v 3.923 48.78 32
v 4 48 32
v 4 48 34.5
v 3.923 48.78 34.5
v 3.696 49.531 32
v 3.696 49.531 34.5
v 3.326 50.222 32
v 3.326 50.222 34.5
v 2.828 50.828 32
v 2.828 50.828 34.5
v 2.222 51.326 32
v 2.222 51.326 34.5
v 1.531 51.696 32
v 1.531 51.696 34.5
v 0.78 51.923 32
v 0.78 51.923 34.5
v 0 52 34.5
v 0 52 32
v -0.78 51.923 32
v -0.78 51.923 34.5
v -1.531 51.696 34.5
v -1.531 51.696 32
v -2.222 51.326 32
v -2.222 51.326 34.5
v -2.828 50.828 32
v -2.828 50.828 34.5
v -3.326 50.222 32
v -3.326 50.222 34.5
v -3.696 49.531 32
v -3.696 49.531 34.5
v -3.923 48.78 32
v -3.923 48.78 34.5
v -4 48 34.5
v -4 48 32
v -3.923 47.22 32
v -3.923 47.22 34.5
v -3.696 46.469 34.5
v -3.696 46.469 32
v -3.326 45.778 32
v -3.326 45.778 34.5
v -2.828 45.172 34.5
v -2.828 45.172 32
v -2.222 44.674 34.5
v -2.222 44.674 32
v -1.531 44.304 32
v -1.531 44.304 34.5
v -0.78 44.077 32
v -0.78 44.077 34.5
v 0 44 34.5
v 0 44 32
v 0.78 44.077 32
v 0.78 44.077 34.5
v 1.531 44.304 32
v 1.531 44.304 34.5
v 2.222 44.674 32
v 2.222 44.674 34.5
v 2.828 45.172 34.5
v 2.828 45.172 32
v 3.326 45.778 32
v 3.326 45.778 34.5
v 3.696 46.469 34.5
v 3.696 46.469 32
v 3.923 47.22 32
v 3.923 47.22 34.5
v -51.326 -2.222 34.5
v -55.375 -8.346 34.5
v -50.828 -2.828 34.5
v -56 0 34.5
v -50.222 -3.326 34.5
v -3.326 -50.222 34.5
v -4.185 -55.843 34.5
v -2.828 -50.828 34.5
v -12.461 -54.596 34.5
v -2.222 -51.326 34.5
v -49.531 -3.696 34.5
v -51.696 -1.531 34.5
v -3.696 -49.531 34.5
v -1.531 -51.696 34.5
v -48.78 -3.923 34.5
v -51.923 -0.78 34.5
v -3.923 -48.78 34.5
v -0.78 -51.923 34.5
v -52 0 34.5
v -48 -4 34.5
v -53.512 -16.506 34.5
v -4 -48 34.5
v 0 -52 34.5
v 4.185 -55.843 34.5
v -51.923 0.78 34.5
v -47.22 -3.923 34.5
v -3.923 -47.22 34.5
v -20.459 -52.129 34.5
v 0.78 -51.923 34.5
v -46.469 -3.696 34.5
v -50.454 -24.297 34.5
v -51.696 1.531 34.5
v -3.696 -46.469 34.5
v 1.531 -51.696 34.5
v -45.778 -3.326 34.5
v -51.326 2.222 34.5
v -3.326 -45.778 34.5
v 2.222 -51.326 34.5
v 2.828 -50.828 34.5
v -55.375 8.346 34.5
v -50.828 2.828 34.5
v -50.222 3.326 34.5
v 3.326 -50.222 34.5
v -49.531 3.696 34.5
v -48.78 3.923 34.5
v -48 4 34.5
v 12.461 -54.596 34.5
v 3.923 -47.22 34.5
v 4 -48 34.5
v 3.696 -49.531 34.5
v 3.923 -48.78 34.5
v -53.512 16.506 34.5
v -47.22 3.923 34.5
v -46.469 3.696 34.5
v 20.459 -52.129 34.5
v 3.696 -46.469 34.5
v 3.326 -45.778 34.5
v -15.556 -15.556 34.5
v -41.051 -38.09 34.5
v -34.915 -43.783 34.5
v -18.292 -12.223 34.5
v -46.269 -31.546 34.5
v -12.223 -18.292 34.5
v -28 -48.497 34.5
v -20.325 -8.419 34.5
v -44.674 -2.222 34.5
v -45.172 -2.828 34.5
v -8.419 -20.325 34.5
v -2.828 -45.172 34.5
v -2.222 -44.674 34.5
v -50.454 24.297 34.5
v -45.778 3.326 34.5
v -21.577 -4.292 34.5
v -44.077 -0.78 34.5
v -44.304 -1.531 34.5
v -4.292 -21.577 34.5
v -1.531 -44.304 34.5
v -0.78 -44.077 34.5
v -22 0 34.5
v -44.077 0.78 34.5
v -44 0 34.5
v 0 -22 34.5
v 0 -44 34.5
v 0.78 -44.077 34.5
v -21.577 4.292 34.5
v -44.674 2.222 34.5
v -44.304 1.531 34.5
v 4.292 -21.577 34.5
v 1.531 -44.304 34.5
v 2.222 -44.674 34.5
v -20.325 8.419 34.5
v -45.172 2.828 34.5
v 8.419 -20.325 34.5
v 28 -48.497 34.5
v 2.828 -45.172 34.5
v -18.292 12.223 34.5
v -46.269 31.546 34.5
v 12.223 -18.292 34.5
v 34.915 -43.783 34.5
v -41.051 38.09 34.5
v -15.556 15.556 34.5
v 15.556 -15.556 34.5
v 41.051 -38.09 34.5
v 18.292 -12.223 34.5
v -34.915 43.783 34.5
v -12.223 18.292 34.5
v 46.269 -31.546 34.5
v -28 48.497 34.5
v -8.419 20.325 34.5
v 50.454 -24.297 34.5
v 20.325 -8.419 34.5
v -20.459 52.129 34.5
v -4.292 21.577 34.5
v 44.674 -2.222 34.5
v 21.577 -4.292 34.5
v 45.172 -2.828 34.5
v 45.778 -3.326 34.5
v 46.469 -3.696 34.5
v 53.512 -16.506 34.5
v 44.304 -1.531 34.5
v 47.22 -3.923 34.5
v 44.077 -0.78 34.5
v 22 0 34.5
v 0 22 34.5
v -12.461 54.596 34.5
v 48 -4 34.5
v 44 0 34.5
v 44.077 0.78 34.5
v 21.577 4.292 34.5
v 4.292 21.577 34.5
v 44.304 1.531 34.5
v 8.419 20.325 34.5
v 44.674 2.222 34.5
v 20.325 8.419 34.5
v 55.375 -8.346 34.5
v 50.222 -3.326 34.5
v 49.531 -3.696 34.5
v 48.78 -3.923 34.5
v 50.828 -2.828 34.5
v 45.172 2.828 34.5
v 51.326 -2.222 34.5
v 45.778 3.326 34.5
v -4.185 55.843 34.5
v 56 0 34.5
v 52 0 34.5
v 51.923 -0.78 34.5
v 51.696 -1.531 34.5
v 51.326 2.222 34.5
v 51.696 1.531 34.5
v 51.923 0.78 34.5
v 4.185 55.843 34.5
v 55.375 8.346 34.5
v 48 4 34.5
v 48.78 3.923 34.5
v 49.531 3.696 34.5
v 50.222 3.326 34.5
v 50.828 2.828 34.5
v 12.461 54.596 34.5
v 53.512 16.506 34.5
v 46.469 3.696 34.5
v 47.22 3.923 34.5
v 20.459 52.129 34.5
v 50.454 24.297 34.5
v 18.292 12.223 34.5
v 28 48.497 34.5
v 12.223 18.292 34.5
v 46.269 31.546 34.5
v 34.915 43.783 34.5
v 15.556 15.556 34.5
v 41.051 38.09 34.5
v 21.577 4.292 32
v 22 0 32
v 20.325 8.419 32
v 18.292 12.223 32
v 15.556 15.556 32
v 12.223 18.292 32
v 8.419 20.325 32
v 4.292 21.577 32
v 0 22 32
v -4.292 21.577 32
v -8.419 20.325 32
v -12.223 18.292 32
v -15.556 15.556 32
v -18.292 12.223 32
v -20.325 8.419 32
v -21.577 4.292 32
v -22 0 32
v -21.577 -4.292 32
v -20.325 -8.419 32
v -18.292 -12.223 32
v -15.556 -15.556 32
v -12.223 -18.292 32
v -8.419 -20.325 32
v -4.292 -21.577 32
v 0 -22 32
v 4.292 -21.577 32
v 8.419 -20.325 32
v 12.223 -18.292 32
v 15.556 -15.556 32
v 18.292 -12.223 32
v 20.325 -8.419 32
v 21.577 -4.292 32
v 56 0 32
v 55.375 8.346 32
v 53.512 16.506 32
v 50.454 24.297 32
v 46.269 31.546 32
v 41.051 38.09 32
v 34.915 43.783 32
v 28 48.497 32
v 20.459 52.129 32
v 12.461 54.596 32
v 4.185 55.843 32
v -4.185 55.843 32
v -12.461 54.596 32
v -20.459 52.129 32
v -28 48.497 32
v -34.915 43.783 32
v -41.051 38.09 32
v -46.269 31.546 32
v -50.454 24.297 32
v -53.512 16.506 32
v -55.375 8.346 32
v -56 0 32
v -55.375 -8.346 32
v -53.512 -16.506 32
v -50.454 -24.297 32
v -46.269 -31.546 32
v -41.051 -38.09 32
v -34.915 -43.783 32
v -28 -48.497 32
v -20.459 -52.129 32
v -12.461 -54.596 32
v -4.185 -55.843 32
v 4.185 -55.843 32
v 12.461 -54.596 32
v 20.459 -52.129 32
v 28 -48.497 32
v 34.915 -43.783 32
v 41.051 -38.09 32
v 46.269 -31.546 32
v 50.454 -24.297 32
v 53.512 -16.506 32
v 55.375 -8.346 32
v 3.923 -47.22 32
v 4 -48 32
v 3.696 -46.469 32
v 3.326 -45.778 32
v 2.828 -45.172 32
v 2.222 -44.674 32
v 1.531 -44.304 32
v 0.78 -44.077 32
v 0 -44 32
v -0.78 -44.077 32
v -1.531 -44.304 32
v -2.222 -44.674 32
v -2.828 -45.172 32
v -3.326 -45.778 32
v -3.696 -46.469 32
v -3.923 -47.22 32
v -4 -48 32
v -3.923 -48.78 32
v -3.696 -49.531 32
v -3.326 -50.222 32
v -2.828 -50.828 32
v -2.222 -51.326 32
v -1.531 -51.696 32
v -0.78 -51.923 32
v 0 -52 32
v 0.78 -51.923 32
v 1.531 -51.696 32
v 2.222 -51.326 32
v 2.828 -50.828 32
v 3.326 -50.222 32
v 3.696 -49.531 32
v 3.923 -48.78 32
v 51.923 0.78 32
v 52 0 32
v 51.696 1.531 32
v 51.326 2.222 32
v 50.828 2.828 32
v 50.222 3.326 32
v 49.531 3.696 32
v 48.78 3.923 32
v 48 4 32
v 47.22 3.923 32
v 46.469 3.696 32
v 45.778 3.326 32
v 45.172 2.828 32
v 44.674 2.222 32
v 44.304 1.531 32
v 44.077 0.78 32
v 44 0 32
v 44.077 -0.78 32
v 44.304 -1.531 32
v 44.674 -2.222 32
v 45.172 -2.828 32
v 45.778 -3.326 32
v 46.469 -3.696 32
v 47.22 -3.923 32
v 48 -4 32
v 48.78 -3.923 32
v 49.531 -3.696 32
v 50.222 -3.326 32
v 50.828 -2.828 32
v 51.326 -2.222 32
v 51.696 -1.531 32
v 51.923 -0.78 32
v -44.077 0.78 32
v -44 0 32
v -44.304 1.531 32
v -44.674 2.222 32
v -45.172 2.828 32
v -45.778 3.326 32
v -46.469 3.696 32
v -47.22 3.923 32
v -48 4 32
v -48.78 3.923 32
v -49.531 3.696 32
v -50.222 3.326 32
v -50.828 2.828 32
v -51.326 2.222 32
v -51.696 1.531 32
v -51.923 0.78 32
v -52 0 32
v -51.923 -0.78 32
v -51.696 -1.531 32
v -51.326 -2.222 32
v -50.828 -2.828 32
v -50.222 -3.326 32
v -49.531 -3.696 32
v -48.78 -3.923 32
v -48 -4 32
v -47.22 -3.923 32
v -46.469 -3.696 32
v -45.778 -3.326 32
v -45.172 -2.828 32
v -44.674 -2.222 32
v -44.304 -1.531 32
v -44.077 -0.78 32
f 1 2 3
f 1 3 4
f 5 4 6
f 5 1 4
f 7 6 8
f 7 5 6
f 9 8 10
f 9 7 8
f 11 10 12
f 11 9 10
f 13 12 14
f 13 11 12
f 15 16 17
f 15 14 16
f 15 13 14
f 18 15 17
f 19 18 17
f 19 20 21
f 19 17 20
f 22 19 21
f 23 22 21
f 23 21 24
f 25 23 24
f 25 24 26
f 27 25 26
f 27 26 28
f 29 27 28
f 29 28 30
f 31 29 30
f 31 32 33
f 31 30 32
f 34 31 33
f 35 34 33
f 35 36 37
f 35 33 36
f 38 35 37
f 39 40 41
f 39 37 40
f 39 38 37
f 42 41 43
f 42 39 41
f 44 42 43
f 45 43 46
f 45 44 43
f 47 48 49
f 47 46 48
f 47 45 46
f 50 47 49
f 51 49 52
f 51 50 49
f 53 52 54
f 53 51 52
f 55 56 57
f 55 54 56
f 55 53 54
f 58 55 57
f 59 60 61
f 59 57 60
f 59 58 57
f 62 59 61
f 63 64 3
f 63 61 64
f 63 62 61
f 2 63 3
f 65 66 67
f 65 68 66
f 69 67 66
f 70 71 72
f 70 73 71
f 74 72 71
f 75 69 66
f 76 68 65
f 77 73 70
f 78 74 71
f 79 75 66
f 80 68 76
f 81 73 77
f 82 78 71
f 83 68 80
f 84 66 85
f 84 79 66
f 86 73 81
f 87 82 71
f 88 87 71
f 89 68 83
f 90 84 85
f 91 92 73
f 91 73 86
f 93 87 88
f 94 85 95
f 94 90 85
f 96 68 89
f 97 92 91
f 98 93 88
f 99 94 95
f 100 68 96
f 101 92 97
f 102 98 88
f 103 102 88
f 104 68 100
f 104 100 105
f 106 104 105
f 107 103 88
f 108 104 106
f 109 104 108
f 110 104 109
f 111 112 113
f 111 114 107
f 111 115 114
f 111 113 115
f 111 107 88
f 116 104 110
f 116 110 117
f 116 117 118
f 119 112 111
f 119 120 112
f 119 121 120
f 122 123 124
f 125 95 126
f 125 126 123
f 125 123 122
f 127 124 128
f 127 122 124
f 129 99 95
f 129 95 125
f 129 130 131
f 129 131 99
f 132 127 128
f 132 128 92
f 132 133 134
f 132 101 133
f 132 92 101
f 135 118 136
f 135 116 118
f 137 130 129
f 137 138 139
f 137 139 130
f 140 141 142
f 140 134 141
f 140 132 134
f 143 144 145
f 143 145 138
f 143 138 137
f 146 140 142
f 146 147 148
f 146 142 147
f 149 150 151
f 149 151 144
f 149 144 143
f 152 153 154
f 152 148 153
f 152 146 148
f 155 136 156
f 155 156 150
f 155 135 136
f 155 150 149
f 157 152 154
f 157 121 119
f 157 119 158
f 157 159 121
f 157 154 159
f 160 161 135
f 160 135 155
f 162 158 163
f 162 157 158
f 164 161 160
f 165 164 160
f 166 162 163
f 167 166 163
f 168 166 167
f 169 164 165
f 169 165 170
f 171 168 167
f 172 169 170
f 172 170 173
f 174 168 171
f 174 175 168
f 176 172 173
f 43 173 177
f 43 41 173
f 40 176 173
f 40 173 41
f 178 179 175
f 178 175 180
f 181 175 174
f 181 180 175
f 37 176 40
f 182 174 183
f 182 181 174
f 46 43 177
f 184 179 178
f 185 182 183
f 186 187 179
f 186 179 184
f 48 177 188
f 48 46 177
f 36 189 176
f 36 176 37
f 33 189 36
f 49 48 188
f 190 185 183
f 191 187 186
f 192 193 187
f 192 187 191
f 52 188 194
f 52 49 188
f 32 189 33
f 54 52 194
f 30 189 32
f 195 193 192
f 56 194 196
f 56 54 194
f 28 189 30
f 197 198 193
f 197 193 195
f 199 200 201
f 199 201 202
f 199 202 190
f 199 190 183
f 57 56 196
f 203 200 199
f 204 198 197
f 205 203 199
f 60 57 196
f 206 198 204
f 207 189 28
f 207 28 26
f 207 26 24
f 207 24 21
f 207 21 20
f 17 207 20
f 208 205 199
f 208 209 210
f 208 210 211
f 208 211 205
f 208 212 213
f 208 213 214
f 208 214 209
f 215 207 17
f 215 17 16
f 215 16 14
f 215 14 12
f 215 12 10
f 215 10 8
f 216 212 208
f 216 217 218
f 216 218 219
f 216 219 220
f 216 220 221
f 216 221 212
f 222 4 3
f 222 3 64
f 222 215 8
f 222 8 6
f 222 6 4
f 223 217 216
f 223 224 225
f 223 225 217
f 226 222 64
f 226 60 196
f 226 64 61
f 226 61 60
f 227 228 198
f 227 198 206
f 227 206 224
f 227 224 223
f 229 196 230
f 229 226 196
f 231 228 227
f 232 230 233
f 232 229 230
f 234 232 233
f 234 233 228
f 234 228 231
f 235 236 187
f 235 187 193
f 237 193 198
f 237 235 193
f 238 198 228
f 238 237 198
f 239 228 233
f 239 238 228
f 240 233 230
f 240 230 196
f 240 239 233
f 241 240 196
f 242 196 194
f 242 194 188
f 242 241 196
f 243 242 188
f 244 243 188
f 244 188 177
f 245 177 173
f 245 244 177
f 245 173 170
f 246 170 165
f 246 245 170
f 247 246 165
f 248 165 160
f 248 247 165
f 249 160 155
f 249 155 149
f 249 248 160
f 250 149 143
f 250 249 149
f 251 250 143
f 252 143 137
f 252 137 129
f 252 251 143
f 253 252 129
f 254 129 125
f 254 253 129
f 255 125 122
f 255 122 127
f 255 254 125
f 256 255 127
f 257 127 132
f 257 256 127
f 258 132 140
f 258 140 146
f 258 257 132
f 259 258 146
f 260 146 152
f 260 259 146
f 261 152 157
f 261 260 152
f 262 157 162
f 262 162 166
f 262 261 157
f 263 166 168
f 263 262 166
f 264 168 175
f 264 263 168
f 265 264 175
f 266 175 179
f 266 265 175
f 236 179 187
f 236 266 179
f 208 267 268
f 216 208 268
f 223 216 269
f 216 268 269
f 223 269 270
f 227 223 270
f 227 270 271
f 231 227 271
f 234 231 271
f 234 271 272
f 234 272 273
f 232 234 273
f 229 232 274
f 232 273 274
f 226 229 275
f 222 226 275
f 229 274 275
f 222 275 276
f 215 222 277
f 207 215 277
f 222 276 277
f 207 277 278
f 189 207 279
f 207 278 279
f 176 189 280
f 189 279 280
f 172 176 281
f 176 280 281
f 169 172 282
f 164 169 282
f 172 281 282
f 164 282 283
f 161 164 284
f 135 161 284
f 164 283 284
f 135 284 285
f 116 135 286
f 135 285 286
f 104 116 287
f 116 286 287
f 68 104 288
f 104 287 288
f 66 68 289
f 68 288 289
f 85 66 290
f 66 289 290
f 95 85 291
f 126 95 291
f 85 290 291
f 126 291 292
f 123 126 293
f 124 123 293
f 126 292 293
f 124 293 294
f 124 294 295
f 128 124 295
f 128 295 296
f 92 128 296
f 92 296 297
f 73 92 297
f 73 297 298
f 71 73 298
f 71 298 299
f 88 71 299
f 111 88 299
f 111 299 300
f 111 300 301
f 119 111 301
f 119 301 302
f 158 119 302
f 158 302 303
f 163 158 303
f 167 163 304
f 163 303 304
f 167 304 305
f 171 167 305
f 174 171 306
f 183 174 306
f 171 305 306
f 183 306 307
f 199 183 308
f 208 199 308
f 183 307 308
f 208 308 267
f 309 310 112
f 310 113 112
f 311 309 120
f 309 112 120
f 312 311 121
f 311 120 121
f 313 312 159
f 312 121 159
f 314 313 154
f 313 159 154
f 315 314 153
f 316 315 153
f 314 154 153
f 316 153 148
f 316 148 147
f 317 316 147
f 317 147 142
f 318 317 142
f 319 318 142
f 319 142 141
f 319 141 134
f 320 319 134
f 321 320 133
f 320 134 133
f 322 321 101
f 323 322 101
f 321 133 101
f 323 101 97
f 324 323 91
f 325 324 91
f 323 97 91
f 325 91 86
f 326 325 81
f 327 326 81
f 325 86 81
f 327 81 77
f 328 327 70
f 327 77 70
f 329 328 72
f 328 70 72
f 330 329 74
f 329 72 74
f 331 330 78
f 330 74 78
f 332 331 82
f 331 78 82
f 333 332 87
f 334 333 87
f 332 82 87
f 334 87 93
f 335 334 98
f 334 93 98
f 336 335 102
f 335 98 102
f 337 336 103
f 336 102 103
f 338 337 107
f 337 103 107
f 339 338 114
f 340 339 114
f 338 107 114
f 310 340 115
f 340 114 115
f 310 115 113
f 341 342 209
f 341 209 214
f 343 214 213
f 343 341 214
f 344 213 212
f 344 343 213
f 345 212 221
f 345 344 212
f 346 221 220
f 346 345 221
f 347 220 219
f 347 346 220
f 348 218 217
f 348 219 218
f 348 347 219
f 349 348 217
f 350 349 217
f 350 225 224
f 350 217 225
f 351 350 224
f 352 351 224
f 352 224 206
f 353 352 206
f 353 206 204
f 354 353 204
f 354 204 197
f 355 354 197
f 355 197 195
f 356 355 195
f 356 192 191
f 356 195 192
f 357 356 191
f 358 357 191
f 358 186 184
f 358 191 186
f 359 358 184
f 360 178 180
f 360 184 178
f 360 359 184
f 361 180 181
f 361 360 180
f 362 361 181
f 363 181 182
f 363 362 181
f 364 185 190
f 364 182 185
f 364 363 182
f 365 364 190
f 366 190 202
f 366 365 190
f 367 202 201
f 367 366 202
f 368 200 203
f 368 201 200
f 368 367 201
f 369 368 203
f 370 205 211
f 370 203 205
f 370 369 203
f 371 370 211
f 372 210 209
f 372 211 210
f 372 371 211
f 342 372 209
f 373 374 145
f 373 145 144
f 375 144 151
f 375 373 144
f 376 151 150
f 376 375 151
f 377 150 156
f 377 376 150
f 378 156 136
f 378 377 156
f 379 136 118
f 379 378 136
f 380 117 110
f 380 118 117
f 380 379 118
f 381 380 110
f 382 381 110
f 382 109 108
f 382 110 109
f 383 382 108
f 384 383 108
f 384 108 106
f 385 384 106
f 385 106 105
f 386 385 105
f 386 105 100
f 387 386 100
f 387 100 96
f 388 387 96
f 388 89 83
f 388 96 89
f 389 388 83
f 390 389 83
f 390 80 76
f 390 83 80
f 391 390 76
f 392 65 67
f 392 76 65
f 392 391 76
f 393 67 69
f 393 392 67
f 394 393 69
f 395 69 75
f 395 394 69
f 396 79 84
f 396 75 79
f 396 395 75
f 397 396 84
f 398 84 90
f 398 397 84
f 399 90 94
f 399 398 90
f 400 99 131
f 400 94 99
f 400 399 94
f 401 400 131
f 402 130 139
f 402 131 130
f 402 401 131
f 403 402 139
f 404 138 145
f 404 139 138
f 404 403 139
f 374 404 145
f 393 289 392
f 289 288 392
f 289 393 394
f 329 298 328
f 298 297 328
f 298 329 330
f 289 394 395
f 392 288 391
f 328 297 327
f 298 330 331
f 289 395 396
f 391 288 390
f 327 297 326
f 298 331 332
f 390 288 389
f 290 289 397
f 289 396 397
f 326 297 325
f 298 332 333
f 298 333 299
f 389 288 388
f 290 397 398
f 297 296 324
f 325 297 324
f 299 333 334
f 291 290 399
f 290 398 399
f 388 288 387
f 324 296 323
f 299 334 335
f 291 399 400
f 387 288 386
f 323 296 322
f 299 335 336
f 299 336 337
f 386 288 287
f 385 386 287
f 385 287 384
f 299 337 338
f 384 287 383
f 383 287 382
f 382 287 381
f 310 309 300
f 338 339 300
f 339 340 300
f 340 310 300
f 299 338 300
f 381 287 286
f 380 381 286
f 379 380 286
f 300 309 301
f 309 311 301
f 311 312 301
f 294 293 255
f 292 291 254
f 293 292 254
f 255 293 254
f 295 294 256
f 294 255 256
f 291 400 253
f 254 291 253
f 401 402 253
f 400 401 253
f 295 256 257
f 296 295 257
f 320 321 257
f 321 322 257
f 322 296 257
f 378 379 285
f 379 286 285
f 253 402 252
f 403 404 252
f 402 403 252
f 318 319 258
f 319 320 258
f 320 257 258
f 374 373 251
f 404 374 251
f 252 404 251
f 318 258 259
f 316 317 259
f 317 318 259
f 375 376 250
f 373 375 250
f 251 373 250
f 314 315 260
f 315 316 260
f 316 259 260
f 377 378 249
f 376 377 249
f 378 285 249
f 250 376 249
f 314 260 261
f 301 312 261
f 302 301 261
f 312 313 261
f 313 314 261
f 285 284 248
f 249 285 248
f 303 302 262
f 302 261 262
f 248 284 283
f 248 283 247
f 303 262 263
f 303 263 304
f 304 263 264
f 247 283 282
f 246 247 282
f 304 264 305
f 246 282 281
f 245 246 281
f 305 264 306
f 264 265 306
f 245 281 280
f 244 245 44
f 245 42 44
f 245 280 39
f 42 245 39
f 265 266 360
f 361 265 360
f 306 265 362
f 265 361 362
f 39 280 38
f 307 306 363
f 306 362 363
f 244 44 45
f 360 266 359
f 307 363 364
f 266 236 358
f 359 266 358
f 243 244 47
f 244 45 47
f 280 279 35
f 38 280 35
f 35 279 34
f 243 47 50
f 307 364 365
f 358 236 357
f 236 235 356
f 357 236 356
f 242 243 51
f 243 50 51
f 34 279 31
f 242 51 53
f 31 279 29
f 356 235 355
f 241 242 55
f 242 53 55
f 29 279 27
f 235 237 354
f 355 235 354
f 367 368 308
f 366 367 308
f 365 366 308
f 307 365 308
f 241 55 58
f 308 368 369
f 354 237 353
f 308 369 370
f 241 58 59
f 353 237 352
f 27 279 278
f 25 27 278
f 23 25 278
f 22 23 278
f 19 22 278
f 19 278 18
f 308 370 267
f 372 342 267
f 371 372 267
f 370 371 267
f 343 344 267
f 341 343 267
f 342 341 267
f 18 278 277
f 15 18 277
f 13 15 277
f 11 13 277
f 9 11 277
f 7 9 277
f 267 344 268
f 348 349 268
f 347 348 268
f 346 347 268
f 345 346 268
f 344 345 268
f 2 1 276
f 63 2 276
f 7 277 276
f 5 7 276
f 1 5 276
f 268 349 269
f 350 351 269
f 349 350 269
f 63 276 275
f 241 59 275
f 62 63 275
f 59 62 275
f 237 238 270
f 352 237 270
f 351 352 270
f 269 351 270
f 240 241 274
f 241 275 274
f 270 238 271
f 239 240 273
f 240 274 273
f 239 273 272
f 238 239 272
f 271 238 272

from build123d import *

# Parameters (mm, degrees)
CARRIER_REAR_START  = 32
SKETCH_1_R          = 56
SKETCH_1_R_2        = 22
CARRIER_REAR_DEPTH  = 2.5
SKETCH_2_R          = 4
THROUGH_HOLES_DEPTH = 100


with BuildPart() as part:
    # Эскиз1 → Carrier_rear (new body)
    with BuildSketch(Plane.XY.offset(CARRIER_REAR_START)):
        Circle(SKETCH_1_R)
        Circle(SKETCH_1_R_2, mode=Mode.SUBTRACT)
    extrude(amount=CARRIER_REAR_DEPTH)

    # Эскиз2 → Through_holes (cut, symmetric)
    with BuildSketch(Plane.XY):
        with Locations((48, 0)):
            Circle(SKETCH_2_R)
        with Locations((0, 48)):
            Circle(SKETCH_2_R)
        with Locations((-48, 0)):
            Circle(SKETCH_2_R)
        with Locations((0, -48)):
            Circle(SKETCH_2_R)
    extrude(amount=THROUGH_HOLES_DEPTH, both=True, mode=Mode.SUBTRACT)


solid = part.part
